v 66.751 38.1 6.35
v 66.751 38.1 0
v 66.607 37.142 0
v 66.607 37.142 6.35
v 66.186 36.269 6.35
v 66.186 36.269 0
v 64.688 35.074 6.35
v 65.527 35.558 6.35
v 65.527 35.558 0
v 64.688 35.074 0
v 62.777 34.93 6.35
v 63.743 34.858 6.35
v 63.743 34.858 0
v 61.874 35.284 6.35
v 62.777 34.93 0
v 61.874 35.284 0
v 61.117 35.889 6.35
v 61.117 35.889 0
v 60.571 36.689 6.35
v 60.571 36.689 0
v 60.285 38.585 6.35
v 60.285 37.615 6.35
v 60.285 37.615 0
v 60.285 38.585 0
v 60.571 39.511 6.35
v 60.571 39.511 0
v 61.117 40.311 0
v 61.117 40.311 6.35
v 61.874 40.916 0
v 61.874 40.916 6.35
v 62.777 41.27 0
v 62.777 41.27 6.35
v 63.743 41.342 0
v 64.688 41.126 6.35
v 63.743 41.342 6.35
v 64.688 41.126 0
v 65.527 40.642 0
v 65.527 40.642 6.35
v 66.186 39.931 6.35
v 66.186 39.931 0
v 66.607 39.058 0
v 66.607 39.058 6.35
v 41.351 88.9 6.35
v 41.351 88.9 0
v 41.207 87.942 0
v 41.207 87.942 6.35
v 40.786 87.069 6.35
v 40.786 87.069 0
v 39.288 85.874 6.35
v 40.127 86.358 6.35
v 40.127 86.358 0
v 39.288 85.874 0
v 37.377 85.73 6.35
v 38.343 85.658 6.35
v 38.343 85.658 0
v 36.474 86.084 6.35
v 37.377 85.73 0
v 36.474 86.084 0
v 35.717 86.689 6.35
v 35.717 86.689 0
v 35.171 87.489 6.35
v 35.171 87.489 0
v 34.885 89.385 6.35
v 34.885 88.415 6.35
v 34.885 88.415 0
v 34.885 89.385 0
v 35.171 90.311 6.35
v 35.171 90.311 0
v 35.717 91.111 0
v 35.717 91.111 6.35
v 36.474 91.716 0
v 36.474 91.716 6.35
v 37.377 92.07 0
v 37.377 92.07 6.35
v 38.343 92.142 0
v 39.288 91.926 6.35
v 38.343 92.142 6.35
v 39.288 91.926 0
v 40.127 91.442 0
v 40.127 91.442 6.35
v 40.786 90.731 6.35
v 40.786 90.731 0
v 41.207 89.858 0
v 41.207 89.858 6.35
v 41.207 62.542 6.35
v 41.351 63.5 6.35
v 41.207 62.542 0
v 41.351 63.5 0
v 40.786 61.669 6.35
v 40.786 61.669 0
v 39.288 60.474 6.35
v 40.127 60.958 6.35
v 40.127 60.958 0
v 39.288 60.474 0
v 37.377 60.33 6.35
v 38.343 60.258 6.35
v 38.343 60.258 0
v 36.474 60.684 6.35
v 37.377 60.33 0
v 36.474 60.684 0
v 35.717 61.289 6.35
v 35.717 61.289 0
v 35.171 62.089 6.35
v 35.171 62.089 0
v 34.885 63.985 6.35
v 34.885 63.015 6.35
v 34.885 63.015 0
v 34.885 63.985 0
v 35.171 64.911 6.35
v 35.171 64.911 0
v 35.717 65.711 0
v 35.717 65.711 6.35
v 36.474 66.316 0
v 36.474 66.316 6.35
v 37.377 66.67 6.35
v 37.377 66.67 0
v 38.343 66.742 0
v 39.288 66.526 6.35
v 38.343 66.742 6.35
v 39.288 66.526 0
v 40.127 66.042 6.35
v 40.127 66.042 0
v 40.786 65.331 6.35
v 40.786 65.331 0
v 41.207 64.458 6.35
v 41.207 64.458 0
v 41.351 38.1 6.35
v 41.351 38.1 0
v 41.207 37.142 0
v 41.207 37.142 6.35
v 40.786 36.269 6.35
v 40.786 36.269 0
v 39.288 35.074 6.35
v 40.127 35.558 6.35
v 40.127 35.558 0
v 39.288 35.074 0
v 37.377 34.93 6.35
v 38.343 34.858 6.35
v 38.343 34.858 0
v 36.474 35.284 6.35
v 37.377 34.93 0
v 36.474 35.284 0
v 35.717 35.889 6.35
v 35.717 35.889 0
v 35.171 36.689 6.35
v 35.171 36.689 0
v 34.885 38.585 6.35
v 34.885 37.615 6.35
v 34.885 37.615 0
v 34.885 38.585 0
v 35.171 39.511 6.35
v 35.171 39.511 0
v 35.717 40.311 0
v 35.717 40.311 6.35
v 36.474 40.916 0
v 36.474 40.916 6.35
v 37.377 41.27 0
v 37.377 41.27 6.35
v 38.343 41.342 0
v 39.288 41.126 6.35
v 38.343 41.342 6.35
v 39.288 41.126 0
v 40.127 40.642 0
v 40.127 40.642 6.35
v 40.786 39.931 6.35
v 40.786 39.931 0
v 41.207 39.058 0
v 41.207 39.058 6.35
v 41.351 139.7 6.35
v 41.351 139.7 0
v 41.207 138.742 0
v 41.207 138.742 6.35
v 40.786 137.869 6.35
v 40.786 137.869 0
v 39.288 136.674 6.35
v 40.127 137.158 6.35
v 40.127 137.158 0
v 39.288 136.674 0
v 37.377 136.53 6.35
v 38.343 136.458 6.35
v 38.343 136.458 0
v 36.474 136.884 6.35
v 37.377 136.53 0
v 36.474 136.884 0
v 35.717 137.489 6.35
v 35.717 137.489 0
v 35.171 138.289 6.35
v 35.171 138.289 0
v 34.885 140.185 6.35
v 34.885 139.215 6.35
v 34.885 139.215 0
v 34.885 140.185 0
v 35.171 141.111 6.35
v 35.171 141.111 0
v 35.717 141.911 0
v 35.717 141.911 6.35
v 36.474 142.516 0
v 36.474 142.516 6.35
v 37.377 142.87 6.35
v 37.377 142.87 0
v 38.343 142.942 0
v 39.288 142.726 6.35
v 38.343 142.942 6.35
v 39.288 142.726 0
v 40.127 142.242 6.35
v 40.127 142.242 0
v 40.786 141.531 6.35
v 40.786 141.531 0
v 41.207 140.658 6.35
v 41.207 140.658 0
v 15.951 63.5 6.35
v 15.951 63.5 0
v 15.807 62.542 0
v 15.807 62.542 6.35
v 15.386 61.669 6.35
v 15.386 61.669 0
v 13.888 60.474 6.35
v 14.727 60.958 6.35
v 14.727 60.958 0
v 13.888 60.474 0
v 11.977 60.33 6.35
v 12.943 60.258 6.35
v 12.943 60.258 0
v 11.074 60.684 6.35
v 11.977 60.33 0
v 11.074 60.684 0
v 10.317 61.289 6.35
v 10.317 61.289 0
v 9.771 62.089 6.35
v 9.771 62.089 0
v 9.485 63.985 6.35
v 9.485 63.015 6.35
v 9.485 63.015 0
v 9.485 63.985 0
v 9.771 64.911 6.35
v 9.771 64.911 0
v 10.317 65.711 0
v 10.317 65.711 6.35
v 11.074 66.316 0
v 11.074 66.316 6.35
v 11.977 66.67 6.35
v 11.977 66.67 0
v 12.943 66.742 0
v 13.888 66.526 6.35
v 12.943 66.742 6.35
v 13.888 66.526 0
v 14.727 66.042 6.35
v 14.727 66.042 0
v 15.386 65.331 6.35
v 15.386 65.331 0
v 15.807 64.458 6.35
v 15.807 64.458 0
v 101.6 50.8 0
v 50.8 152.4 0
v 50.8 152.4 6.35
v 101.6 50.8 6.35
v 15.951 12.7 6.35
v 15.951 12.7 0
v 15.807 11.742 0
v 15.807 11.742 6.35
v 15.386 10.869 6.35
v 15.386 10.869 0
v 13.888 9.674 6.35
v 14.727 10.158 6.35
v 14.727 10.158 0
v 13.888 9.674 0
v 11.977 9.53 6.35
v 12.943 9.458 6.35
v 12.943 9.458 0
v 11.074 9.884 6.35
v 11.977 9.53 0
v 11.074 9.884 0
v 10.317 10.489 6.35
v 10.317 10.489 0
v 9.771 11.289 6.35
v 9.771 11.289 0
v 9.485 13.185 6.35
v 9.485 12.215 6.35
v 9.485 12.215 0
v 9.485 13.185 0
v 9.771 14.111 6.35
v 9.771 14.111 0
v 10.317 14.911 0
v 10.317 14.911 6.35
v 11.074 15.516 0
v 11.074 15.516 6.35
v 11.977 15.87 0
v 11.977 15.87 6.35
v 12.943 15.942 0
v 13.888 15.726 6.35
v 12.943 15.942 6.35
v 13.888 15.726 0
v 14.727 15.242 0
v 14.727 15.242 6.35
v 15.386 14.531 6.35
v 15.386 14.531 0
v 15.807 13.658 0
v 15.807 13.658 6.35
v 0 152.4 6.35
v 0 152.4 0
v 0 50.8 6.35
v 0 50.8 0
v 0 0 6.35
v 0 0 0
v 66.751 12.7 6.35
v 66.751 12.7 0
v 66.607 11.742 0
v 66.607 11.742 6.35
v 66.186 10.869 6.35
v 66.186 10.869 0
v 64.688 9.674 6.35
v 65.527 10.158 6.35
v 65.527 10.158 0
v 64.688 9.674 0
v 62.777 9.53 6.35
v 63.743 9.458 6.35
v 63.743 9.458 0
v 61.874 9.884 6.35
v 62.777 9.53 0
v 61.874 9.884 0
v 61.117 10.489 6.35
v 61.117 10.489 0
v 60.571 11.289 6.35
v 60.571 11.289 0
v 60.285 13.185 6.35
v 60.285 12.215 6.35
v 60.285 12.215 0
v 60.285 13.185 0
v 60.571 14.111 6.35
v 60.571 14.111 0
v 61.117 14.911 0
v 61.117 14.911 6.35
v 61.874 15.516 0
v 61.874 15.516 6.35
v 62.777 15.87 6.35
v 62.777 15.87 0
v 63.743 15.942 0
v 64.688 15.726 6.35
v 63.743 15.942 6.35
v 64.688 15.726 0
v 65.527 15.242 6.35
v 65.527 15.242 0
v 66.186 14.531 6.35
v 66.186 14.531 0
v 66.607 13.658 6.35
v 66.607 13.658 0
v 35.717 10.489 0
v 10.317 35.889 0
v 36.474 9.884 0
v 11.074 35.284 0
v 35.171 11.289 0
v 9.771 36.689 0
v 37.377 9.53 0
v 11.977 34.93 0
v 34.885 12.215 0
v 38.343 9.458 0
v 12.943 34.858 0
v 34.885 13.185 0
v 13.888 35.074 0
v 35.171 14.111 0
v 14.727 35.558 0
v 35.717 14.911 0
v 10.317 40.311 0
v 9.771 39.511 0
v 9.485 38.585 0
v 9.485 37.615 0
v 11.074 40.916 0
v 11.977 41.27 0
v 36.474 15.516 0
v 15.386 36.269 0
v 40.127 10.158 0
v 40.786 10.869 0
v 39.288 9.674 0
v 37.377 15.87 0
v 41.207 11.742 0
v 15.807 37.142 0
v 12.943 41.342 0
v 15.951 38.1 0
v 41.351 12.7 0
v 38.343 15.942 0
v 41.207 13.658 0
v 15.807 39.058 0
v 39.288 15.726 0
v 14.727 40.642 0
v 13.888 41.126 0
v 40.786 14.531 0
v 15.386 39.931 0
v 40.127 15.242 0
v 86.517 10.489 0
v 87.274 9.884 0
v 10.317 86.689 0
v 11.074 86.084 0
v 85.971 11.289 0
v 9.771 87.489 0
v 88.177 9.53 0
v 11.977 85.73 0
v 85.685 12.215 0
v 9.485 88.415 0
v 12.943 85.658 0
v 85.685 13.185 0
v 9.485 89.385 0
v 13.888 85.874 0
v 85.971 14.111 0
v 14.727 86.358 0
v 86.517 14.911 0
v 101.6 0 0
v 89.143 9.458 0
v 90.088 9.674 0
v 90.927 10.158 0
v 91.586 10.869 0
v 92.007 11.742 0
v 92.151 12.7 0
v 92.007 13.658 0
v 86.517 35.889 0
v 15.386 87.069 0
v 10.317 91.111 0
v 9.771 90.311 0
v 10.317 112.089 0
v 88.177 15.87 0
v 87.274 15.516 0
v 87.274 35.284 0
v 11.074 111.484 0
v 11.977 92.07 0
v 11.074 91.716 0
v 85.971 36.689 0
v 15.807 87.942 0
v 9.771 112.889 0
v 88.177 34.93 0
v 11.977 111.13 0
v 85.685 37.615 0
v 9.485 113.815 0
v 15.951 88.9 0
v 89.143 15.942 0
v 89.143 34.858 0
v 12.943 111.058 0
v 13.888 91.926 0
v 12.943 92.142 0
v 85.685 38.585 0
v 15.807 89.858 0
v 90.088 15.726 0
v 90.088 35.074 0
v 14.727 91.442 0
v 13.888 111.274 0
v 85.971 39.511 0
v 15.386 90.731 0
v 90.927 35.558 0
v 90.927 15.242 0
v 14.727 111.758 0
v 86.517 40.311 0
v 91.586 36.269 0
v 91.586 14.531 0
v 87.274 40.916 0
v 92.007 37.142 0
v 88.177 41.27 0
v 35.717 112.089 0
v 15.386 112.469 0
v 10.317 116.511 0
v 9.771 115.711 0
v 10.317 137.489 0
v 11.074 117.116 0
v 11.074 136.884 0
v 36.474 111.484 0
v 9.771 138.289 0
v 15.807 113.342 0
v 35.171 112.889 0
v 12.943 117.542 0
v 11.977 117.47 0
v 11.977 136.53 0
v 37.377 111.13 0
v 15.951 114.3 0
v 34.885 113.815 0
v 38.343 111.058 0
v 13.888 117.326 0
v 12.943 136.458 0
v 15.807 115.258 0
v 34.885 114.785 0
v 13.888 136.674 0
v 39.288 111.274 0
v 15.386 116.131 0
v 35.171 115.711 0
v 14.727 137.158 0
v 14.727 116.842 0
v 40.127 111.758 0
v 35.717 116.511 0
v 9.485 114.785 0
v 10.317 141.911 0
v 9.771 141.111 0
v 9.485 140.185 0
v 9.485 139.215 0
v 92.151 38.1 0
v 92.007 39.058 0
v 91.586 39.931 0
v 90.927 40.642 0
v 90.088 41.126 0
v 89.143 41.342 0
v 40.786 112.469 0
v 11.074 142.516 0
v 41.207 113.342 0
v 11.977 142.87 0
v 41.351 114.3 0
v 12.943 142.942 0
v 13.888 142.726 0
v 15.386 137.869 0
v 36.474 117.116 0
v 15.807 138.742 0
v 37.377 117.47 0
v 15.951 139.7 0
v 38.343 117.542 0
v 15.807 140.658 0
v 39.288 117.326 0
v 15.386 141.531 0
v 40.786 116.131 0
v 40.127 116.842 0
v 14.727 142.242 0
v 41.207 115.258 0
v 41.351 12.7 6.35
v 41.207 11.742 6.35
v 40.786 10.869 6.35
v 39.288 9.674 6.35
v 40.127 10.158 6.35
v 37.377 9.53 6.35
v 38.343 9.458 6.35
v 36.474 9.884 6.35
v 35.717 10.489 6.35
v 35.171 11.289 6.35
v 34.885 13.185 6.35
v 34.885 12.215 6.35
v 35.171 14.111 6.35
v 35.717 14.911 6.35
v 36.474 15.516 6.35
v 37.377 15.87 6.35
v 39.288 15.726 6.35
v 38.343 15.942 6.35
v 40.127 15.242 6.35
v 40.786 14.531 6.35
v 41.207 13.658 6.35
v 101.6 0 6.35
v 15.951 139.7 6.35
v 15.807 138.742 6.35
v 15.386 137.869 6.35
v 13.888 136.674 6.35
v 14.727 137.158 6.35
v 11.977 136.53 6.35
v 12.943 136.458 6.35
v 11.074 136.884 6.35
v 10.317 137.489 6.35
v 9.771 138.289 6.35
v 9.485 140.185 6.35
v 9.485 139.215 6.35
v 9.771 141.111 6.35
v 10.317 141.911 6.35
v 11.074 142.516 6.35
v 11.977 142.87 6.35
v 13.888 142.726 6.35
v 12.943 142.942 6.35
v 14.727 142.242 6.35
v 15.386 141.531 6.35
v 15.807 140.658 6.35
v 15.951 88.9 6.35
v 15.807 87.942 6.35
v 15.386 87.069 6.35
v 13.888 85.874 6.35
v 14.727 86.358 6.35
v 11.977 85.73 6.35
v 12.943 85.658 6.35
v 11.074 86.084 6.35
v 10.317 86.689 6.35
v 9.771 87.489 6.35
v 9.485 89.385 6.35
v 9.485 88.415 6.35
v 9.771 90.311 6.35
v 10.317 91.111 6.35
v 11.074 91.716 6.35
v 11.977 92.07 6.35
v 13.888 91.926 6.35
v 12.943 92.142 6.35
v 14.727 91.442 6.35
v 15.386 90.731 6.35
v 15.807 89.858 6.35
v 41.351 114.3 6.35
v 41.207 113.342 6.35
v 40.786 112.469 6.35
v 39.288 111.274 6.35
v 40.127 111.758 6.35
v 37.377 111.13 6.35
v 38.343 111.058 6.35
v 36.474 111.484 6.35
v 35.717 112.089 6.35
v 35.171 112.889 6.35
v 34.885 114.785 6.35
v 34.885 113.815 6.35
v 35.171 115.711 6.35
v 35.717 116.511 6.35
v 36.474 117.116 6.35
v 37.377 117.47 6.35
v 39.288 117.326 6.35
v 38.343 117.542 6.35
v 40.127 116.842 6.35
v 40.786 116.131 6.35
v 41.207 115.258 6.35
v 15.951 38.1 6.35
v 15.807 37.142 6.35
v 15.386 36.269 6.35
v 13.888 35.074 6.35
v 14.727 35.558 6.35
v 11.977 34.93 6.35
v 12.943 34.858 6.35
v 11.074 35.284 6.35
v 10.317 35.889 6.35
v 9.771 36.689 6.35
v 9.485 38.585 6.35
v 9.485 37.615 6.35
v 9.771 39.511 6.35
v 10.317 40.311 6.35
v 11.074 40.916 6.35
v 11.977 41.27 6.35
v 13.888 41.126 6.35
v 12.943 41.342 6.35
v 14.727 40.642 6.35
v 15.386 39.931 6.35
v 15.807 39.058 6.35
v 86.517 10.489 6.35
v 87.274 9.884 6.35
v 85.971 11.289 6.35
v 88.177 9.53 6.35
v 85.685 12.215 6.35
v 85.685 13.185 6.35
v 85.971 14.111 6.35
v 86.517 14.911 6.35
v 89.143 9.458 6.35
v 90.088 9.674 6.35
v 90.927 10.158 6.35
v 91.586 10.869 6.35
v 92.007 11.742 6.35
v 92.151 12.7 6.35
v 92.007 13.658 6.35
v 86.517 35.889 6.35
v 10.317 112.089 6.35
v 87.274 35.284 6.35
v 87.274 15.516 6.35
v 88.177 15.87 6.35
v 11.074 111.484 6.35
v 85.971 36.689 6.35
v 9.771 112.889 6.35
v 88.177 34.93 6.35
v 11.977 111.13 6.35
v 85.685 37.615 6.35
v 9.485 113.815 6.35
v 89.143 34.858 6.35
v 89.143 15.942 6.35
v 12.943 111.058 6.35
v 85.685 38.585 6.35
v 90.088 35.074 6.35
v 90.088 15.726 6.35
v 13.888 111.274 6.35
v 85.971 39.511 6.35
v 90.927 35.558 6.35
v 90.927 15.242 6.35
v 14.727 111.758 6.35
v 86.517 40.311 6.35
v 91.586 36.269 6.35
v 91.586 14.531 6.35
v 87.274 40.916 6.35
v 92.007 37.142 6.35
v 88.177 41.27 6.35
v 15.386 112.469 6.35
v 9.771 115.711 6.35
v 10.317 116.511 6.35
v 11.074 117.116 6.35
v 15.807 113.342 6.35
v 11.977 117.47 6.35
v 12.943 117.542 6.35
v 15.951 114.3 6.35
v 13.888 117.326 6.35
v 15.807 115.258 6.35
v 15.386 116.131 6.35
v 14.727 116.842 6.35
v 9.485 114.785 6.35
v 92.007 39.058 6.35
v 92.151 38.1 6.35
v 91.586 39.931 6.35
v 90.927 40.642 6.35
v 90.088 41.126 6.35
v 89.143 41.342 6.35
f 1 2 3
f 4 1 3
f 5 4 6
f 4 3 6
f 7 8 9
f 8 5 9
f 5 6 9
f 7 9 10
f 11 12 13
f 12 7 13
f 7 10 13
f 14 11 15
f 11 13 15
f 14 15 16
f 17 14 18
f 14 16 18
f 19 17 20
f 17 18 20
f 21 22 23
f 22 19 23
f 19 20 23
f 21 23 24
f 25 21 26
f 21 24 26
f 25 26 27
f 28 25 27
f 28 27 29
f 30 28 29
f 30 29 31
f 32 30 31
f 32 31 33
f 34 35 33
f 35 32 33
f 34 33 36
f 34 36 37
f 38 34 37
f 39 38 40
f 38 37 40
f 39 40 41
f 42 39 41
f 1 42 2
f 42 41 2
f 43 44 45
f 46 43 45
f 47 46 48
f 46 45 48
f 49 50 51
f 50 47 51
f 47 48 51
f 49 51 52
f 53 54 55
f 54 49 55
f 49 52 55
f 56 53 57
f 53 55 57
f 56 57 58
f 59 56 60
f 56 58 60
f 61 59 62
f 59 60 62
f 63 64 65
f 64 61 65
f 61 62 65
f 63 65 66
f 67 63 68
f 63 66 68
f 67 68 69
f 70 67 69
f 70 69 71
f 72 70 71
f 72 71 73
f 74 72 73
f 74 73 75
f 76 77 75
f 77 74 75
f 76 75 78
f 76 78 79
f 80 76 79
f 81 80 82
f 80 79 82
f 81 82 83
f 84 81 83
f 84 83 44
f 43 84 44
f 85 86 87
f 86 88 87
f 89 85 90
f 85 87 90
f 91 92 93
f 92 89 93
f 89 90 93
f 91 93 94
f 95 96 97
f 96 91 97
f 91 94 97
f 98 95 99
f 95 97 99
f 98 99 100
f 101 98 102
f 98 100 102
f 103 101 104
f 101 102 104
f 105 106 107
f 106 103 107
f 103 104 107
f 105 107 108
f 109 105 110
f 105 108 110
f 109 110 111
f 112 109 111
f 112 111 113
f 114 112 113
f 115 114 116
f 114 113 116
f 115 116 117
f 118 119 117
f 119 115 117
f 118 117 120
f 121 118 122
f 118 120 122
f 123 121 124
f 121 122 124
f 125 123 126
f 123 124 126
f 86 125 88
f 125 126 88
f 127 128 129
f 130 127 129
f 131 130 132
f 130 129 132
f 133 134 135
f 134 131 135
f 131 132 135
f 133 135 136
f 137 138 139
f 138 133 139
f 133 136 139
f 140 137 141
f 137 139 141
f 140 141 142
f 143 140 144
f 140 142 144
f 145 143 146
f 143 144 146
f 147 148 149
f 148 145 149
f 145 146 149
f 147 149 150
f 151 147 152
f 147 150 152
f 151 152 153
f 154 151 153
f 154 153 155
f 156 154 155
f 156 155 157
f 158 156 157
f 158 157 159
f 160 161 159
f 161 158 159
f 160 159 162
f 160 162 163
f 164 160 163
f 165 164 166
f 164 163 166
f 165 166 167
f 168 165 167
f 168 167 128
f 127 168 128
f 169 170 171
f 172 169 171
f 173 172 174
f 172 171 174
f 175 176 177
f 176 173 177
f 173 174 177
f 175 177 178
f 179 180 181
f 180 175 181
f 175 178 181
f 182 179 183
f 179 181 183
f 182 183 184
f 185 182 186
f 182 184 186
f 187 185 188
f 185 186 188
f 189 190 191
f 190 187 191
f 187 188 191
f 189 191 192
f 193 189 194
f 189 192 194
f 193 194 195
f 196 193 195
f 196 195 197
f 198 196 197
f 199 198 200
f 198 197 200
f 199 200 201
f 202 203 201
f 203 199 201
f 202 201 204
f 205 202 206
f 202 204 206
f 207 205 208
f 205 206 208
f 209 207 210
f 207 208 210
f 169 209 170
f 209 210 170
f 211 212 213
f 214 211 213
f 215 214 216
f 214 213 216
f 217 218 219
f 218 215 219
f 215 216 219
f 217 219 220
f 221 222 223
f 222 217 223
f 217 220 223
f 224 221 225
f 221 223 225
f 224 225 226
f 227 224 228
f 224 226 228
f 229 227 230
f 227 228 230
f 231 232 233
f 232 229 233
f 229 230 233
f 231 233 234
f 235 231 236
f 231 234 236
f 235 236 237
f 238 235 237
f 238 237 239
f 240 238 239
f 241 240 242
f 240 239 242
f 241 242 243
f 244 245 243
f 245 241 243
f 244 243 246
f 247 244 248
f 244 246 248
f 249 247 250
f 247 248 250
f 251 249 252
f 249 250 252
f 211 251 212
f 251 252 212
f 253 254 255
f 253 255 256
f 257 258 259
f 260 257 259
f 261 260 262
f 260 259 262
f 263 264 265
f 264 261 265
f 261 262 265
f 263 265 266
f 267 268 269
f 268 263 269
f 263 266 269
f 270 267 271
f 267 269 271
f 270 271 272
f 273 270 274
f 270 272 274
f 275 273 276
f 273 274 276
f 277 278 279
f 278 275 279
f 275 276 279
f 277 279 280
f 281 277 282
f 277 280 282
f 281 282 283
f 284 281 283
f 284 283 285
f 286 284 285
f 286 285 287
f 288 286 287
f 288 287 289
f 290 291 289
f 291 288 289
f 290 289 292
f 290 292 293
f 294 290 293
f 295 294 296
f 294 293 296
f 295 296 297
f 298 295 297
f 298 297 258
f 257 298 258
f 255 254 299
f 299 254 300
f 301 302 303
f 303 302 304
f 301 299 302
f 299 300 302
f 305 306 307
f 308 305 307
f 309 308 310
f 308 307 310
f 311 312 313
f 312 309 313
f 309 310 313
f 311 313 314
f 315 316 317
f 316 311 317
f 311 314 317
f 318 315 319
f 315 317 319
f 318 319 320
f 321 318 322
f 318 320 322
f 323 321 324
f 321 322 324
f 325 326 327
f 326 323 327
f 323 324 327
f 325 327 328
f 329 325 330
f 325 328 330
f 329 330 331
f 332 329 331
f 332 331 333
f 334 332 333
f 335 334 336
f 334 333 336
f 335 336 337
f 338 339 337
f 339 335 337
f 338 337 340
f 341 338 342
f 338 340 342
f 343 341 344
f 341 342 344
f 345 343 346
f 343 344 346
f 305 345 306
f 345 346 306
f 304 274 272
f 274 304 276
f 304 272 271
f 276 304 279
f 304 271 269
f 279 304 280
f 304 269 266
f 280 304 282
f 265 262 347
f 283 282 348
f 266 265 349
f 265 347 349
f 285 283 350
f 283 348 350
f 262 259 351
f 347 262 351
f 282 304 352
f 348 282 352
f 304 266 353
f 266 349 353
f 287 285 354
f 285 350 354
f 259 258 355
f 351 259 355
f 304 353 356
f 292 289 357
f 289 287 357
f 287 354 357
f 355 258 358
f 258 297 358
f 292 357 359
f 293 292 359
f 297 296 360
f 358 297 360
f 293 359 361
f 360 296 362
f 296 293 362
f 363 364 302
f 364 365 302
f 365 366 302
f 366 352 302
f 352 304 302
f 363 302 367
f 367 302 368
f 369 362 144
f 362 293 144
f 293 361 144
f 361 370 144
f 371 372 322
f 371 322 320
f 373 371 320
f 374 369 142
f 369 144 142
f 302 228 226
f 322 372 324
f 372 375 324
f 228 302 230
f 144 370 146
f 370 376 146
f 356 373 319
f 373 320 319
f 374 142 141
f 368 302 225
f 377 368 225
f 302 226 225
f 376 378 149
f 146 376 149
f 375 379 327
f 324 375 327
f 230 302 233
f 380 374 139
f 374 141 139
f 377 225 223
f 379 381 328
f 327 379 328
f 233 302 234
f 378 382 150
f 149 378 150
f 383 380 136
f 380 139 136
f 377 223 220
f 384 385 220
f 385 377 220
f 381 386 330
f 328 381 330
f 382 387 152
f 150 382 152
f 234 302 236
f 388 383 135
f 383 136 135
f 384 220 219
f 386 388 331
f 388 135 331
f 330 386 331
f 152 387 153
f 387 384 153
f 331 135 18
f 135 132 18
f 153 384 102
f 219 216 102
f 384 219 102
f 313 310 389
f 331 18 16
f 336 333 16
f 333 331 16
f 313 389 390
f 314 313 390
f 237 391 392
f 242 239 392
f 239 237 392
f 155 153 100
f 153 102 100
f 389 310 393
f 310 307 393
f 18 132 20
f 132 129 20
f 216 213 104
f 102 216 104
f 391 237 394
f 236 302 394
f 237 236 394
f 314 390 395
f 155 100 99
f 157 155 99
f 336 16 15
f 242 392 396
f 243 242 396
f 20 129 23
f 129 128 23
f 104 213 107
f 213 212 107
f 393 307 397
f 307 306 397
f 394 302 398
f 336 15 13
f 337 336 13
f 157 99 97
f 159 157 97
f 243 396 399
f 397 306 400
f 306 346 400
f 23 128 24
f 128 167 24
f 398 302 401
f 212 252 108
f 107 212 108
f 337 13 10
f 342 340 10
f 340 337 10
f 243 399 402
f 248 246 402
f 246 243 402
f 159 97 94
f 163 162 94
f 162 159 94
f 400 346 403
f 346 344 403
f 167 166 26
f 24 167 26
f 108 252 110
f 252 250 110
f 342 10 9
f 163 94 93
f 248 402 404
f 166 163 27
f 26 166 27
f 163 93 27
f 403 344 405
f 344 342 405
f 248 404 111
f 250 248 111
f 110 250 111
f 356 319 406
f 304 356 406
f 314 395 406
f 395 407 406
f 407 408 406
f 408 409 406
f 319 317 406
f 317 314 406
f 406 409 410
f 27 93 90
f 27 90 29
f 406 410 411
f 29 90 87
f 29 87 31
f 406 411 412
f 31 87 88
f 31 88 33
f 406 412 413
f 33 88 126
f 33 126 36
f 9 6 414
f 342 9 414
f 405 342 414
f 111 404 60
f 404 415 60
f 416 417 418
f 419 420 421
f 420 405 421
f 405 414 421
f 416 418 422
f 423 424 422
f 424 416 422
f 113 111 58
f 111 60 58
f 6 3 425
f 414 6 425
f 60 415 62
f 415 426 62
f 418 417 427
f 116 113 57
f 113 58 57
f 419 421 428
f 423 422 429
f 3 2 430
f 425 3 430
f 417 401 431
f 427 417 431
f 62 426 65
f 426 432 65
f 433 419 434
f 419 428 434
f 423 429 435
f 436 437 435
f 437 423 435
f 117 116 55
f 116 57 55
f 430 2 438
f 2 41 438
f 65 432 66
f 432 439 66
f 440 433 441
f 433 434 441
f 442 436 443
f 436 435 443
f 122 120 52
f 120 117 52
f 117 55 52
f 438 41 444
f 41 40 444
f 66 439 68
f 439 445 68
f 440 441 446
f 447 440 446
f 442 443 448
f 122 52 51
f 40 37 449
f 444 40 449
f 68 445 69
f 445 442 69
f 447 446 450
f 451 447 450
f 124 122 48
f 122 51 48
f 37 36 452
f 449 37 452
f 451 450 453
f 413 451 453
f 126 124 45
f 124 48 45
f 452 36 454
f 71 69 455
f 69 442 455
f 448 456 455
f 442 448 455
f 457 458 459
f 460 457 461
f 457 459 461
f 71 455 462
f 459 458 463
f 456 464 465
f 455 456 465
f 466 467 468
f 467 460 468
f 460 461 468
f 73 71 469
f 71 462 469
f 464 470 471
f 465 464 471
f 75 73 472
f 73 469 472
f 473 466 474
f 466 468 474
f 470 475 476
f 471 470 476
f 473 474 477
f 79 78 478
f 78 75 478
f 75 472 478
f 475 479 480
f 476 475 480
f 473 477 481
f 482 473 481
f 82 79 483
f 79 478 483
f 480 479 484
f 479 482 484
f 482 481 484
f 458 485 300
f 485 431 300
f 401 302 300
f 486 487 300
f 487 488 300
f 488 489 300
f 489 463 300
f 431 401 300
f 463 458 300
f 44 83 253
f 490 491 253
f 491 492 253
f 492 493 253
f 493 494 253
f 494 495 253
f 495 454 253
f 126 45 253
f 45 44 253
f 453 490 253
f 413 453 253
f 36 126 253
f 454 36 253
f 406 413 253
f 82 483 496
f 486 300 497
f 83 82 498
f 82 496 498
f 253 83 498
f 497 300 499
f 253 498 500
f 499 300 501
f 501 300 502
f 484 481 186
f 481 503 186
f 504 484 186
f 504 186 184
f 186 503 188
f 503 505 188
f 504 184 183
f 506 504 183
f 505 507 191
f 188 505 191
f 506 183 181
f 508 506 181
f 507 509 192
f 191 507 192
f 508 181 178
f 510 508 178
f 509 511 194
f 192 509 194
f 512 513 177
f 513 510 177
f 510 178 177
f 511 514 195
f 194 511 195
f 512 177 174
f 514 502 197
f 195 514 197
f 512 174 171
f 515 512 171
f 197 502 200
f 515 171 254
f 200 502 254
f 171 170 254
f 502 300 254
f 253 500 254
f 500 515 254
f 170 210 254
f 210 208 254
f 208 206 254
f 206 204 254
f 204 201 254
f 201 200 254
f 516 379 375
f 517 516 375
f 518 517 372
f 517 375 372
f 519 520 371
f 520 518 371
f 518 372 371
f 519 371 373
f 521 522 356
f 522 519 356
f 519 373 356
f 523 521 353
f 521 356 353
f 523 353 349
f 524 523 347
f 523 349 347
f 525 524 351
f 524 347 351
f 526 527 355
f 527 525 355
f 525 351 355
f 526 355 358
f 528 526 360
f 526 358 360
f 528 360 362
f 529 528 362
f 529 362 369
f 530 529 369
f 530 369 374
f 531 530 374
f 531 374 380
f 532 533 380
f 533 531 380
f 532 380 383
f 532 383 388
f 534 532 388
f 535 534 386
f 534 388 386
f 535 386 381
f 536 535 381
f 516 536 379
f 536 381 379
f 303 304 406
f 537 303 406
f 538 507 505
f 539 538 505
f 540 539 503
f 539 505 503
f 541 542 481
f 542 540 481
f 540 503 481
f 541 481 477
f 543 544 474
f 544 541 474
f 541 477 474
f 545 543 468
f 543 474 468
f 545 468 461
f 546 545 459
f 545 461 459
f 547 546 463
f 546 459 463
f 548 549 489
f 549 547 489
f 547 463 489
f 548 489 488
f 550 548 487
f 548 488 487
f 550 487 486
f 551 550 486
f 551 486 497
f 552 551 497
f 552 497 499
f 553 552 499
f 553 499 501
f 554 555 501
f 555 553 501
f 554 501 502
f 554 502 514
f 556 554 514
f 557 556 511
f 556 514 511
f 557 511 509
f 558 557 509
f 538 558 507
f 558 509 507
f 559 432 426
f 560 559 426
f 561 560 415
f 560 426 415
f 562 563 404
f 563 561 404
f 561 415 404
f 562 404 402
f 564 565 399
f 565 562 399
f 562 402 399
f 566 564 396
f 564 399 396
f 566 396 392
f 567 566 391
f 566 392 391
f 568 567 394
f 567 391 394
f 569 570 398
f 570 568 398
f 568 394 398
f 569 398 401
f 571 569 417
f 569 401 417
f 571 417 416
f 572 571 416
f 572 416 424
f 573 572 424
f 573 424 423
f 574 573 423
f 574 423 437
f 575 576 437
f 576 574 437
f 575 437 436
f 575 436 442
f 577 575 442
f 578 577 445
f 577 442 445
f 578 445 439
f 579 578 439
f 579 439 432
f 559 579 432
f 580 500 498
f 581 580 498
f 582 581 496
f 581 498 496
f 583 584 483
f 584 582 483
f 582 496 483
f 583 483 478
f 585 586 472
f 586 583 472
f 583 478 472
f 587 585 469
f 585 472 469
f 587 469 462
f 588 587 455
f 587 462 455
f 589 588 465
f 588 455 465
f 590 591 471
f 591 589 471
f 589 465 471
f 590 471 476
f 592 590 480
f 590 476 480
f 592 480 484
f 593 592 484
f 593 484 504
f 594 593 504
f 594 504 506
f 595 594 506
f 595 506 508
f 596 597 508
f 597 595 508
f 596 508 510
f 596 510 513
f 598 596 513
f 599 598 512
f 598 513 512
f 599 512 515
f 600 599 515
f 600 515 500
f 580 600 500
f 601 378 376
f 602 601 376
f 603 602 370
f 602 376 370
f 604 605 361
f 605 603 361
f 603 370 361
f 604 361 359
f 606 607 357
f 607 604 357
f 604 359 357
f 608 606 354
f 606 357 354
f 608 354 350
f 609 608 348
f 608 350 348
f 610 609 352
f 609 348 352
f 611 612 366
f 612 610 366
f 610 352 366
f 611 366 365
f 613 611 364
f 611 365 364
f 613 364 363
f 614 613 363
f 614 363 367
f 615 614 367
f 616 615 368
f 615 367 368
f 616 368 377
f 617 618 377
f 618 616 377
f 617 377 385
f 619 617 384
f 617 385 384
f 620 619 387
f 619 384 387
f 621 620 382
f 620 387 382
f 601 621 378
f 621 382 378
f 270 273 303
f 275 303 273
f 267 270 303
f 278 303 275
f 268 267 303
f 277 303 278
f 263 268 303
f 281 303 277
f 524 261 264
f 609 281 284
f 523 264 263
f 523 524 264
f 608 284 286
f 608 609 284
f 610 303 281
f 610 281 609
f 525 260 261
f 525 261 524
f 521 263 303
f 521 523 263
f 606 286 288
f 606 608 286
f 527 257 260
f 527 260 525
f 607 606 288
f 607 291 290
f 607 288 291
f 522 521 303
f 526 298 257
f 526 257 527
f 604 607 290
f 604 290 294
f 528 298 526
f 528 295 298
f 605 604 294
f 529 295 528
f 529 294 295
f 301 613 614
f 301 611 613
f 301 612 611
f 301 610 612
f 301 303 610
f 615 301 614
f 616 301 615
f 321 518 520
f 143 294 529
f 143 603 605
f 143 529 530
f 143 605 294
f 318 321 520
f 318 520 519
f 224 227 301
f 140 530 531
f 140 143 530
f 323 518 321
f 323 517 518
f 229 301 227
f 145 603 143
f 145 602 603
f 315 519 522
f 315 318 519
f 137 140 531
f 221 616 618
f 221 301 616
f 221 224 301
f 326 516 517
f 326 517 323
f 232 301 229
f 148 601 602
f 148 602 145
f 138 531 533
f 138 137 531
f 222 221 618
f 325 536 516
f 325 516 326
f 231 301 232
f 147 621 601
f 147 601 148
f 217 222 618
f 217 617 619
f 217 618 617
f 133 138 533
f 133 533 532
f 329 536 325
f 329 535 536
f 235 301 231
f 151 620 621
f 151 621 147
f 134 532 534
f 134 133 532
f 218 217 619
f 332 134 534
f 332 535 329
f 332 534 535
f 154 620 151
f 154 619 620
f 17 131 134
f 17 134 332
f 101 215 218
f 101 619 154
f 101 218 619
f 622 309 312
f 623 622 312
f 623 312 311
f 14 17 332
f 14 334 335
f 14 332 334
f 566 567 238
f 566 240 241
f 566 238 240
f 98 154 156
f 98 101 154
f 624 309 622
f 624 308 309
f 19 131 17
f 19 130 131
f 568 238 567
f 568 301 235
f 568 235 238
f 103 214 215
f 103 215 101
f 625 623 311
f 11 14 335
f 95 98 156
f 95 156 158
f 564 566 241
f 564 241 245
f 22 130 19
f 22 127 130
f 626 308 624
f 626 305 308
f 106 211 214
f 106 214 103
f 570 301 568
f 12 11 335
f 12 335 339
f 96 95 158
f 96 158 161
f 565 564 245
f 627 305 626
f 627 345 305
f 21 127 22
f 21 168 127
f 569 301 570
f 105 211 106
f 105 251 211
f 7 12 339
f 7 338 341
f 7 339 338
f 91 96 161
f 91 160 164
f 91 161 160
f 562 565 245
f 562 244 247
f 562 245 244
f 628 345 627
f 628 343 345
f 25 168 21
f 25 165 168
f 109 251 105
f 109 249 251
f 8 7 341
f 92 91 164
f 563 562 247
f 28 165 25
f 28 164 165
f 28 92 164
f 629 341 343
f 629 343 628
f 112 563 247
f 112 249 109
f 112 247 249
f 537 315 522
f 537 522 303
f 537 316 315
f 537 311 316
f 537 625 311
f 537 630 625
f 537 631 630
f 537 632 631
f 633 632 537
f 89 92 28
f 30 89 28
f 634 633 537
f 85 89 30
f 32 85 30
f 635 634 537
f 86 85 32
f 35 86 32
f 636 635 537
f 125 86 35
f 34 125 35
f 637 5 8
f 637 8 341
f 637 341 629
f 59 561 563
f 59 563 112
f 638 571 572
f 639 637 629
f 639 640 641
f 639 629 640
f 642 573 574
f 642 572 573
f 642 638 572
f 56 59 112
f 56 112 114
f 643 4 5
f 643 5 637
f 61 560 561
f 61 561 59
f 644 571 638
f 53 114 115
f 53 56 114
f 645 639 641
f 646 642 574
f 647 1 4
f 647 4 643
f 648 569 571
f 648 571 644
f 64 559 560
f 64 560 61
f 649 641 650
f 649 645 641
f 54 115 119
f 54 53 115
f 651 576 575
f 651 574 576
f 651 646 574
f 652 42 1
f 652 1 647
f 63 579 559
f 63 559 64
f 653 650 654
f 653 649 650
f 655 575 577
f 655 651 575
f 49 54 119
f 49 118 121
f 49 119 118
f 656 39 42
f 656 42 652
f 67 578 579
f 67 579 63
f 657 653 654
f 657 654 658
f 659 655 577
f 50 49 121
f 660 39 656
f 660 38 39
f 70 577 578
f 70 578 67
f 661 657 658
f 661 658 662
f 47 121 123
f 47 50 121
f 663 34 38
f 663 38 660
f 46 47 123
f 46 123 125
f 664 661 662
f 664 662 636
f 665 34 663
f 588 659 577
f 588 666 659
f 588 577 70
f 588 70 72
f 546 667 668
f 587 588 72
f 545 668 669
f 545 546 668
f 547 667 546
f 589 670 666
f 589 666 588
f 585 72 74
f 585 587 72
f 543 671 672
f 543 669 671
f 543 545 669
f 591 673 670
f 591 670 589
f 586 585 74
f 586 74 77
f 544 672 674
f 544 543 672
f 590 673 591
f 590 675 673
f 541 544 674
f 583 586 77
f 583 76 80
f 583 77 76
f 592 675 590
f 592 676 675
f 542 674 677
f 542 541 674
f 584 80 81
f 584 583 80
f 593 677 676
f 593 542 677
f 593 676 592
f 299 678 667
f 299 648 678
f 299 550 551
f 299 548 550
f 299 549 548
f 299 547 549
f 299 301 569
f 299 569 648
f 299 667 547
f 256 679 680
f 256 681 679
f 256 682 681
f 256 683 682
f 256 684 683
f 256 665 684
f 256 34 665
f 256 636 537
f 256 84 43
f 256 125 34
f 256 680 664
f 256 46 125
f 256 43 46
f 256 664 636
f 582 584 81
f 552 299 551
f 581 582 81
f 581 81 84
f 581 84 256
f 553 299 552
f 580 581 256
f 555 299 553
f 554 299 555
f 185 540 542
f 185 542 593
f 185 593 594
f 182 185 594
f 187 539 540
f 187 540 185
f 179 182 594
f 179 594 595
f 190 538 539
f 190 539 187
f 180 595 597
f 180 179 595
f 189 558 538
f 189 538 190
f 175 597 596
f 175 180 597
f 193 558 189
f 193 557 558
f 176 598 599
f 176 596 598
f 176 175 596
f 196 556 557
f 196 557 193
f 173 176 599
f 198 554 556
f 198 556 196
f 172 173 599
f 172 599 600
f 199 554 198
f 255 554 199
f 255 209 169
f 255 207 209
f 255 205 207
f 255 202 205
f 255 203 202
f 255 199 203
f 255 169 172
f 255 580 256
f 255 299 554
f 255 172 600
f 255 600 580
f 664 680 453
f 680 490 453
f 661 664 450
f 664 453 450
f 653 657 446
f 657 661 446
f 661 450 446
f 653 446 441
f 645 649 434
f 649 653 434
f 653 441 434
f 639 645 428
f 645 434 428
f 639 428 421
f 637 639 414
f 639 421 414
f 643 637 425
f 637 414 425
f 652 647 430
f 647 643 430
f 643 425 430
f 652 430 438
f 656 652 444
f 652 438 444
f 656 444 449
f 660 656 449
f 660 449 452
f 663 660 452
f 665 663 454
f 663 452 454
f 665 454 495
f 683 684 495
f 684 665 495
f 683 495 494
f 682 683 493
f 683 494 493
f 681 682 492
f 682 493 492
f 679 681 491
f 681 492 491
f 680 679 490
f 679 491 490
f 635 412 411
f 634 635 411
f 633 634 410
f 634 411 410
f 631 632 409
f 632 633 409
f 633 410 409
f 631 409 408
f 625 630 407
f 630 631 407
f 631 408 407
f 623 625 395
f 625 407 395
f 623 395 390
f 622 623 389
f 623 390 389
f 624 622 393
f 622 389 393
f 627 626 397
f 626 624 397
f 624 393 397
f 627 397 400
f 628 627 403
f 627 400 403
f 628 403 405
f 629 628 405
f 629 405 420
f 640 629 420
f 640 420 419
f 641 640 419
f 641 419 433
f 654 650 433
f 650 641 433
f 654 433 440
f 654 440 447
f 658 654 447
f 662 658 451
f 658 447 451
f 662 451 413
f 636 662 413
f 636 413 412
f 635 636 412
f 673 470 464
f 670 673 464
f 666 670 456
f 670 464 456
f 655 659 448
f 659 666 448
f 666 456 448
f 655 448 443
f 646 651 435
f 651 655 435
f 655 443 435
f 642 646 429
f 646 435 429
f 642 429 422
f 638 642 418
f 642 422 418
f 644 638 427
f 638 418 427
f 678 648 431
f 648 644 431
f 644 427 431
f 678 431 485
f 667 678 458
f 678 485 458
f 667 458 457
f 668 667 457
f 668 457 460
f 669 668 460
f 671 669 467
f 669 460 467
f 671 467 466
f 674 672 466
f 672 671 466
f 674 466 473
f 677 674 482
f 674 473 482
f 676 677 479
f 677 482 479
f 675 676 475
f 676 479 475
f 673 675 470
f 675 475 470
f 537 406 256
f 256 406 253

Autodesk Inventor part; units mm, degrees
ref_plane "YZ Plane" through (0, 0, 0) normal (1, 0, 0) x (0, 1, 0)
ref_plane "XZ Plane" through (0, 0, 0) normal (0, 1, 0) x (-1, 0, 0)
ref_plane "XY Plane" through (0, 0, 0) normal (0, 0, 1) x (1, 0, 0)
sketch "Sketch1" plane through (0, 0, 0) normal (0, 0, 1) x (1, 0, 0)
  line L0 (0, 0) -> (101.6, 0)
  line L1 (101.6, 0) -> (101.6, 50.8)
  line L2 (0, 50.8) -> (0, 0)
  line L3 (50.8, 152.4) -> (0, 152.4)
  line L4 (0, 152.4) -> (0, 50.8)
  line L5 (50.8, 152.4) -> (101.6, 50.8)
  circle A0 centre (12.7, 12.7) radius 3.2512
  circle A1 centre (12.7, 38.1) radius 3.2512
  circle A2 centre (12.7, 63.5) radius 3.2512
  circle A3 centre (12.7, 88.9) radius 3.2512
  circle A4 centre (12.7, 114.3) radius 3.2512
  circle A5 centre (12.7, 139.7) radius 3.2512
  circle A6 centre (38.1, 12.7) radius 3.2512
  circle A7 centre (38.1, 38.1) radius 3.2512
  circle A8 centre (38.1, 63.5) radius 3.2512
  circle A9 centre (38.1, 88.9) radius 3.2512
  circle A10 centre (38.1, 114.3) radius 3.2512
  circle A11 centre (38.1, 139.7) radius 3.2512
  circle A12 centre (63.5, 12.7) radius 3.2512
  circle A13 centre (88.9, 12.7) radius 3.2512
  circle A14 centre (38.1, 38.1) radius 3.2512
  circle A15 centre (63.5, 38.1) radius 3.2512
  circle A16 centre (88.9, 38.1) radius 3.2512
  dimension "d6" = 101.6
  dimension "d7" = 50.8
  dimension "d8" = 50.8
  dimension "d9" = 101.6
  dimension "d10" = 50.8
  dimension "d11" = 101.6
  dimension "d12" = 50.8
  dimension "d13" = 6.5024
  dimension "d14" = 12.7
  dimension "d15" = 12.7
  dimension "d18" = 25.4
  dimension "d21" = 25.4
  dimension "d26" = 25.4
  dimension "d29" = 25.4
extrude "Extrusion1" add sketch "Sketch1" along normal blind 6.35
properties part number "6x4"
